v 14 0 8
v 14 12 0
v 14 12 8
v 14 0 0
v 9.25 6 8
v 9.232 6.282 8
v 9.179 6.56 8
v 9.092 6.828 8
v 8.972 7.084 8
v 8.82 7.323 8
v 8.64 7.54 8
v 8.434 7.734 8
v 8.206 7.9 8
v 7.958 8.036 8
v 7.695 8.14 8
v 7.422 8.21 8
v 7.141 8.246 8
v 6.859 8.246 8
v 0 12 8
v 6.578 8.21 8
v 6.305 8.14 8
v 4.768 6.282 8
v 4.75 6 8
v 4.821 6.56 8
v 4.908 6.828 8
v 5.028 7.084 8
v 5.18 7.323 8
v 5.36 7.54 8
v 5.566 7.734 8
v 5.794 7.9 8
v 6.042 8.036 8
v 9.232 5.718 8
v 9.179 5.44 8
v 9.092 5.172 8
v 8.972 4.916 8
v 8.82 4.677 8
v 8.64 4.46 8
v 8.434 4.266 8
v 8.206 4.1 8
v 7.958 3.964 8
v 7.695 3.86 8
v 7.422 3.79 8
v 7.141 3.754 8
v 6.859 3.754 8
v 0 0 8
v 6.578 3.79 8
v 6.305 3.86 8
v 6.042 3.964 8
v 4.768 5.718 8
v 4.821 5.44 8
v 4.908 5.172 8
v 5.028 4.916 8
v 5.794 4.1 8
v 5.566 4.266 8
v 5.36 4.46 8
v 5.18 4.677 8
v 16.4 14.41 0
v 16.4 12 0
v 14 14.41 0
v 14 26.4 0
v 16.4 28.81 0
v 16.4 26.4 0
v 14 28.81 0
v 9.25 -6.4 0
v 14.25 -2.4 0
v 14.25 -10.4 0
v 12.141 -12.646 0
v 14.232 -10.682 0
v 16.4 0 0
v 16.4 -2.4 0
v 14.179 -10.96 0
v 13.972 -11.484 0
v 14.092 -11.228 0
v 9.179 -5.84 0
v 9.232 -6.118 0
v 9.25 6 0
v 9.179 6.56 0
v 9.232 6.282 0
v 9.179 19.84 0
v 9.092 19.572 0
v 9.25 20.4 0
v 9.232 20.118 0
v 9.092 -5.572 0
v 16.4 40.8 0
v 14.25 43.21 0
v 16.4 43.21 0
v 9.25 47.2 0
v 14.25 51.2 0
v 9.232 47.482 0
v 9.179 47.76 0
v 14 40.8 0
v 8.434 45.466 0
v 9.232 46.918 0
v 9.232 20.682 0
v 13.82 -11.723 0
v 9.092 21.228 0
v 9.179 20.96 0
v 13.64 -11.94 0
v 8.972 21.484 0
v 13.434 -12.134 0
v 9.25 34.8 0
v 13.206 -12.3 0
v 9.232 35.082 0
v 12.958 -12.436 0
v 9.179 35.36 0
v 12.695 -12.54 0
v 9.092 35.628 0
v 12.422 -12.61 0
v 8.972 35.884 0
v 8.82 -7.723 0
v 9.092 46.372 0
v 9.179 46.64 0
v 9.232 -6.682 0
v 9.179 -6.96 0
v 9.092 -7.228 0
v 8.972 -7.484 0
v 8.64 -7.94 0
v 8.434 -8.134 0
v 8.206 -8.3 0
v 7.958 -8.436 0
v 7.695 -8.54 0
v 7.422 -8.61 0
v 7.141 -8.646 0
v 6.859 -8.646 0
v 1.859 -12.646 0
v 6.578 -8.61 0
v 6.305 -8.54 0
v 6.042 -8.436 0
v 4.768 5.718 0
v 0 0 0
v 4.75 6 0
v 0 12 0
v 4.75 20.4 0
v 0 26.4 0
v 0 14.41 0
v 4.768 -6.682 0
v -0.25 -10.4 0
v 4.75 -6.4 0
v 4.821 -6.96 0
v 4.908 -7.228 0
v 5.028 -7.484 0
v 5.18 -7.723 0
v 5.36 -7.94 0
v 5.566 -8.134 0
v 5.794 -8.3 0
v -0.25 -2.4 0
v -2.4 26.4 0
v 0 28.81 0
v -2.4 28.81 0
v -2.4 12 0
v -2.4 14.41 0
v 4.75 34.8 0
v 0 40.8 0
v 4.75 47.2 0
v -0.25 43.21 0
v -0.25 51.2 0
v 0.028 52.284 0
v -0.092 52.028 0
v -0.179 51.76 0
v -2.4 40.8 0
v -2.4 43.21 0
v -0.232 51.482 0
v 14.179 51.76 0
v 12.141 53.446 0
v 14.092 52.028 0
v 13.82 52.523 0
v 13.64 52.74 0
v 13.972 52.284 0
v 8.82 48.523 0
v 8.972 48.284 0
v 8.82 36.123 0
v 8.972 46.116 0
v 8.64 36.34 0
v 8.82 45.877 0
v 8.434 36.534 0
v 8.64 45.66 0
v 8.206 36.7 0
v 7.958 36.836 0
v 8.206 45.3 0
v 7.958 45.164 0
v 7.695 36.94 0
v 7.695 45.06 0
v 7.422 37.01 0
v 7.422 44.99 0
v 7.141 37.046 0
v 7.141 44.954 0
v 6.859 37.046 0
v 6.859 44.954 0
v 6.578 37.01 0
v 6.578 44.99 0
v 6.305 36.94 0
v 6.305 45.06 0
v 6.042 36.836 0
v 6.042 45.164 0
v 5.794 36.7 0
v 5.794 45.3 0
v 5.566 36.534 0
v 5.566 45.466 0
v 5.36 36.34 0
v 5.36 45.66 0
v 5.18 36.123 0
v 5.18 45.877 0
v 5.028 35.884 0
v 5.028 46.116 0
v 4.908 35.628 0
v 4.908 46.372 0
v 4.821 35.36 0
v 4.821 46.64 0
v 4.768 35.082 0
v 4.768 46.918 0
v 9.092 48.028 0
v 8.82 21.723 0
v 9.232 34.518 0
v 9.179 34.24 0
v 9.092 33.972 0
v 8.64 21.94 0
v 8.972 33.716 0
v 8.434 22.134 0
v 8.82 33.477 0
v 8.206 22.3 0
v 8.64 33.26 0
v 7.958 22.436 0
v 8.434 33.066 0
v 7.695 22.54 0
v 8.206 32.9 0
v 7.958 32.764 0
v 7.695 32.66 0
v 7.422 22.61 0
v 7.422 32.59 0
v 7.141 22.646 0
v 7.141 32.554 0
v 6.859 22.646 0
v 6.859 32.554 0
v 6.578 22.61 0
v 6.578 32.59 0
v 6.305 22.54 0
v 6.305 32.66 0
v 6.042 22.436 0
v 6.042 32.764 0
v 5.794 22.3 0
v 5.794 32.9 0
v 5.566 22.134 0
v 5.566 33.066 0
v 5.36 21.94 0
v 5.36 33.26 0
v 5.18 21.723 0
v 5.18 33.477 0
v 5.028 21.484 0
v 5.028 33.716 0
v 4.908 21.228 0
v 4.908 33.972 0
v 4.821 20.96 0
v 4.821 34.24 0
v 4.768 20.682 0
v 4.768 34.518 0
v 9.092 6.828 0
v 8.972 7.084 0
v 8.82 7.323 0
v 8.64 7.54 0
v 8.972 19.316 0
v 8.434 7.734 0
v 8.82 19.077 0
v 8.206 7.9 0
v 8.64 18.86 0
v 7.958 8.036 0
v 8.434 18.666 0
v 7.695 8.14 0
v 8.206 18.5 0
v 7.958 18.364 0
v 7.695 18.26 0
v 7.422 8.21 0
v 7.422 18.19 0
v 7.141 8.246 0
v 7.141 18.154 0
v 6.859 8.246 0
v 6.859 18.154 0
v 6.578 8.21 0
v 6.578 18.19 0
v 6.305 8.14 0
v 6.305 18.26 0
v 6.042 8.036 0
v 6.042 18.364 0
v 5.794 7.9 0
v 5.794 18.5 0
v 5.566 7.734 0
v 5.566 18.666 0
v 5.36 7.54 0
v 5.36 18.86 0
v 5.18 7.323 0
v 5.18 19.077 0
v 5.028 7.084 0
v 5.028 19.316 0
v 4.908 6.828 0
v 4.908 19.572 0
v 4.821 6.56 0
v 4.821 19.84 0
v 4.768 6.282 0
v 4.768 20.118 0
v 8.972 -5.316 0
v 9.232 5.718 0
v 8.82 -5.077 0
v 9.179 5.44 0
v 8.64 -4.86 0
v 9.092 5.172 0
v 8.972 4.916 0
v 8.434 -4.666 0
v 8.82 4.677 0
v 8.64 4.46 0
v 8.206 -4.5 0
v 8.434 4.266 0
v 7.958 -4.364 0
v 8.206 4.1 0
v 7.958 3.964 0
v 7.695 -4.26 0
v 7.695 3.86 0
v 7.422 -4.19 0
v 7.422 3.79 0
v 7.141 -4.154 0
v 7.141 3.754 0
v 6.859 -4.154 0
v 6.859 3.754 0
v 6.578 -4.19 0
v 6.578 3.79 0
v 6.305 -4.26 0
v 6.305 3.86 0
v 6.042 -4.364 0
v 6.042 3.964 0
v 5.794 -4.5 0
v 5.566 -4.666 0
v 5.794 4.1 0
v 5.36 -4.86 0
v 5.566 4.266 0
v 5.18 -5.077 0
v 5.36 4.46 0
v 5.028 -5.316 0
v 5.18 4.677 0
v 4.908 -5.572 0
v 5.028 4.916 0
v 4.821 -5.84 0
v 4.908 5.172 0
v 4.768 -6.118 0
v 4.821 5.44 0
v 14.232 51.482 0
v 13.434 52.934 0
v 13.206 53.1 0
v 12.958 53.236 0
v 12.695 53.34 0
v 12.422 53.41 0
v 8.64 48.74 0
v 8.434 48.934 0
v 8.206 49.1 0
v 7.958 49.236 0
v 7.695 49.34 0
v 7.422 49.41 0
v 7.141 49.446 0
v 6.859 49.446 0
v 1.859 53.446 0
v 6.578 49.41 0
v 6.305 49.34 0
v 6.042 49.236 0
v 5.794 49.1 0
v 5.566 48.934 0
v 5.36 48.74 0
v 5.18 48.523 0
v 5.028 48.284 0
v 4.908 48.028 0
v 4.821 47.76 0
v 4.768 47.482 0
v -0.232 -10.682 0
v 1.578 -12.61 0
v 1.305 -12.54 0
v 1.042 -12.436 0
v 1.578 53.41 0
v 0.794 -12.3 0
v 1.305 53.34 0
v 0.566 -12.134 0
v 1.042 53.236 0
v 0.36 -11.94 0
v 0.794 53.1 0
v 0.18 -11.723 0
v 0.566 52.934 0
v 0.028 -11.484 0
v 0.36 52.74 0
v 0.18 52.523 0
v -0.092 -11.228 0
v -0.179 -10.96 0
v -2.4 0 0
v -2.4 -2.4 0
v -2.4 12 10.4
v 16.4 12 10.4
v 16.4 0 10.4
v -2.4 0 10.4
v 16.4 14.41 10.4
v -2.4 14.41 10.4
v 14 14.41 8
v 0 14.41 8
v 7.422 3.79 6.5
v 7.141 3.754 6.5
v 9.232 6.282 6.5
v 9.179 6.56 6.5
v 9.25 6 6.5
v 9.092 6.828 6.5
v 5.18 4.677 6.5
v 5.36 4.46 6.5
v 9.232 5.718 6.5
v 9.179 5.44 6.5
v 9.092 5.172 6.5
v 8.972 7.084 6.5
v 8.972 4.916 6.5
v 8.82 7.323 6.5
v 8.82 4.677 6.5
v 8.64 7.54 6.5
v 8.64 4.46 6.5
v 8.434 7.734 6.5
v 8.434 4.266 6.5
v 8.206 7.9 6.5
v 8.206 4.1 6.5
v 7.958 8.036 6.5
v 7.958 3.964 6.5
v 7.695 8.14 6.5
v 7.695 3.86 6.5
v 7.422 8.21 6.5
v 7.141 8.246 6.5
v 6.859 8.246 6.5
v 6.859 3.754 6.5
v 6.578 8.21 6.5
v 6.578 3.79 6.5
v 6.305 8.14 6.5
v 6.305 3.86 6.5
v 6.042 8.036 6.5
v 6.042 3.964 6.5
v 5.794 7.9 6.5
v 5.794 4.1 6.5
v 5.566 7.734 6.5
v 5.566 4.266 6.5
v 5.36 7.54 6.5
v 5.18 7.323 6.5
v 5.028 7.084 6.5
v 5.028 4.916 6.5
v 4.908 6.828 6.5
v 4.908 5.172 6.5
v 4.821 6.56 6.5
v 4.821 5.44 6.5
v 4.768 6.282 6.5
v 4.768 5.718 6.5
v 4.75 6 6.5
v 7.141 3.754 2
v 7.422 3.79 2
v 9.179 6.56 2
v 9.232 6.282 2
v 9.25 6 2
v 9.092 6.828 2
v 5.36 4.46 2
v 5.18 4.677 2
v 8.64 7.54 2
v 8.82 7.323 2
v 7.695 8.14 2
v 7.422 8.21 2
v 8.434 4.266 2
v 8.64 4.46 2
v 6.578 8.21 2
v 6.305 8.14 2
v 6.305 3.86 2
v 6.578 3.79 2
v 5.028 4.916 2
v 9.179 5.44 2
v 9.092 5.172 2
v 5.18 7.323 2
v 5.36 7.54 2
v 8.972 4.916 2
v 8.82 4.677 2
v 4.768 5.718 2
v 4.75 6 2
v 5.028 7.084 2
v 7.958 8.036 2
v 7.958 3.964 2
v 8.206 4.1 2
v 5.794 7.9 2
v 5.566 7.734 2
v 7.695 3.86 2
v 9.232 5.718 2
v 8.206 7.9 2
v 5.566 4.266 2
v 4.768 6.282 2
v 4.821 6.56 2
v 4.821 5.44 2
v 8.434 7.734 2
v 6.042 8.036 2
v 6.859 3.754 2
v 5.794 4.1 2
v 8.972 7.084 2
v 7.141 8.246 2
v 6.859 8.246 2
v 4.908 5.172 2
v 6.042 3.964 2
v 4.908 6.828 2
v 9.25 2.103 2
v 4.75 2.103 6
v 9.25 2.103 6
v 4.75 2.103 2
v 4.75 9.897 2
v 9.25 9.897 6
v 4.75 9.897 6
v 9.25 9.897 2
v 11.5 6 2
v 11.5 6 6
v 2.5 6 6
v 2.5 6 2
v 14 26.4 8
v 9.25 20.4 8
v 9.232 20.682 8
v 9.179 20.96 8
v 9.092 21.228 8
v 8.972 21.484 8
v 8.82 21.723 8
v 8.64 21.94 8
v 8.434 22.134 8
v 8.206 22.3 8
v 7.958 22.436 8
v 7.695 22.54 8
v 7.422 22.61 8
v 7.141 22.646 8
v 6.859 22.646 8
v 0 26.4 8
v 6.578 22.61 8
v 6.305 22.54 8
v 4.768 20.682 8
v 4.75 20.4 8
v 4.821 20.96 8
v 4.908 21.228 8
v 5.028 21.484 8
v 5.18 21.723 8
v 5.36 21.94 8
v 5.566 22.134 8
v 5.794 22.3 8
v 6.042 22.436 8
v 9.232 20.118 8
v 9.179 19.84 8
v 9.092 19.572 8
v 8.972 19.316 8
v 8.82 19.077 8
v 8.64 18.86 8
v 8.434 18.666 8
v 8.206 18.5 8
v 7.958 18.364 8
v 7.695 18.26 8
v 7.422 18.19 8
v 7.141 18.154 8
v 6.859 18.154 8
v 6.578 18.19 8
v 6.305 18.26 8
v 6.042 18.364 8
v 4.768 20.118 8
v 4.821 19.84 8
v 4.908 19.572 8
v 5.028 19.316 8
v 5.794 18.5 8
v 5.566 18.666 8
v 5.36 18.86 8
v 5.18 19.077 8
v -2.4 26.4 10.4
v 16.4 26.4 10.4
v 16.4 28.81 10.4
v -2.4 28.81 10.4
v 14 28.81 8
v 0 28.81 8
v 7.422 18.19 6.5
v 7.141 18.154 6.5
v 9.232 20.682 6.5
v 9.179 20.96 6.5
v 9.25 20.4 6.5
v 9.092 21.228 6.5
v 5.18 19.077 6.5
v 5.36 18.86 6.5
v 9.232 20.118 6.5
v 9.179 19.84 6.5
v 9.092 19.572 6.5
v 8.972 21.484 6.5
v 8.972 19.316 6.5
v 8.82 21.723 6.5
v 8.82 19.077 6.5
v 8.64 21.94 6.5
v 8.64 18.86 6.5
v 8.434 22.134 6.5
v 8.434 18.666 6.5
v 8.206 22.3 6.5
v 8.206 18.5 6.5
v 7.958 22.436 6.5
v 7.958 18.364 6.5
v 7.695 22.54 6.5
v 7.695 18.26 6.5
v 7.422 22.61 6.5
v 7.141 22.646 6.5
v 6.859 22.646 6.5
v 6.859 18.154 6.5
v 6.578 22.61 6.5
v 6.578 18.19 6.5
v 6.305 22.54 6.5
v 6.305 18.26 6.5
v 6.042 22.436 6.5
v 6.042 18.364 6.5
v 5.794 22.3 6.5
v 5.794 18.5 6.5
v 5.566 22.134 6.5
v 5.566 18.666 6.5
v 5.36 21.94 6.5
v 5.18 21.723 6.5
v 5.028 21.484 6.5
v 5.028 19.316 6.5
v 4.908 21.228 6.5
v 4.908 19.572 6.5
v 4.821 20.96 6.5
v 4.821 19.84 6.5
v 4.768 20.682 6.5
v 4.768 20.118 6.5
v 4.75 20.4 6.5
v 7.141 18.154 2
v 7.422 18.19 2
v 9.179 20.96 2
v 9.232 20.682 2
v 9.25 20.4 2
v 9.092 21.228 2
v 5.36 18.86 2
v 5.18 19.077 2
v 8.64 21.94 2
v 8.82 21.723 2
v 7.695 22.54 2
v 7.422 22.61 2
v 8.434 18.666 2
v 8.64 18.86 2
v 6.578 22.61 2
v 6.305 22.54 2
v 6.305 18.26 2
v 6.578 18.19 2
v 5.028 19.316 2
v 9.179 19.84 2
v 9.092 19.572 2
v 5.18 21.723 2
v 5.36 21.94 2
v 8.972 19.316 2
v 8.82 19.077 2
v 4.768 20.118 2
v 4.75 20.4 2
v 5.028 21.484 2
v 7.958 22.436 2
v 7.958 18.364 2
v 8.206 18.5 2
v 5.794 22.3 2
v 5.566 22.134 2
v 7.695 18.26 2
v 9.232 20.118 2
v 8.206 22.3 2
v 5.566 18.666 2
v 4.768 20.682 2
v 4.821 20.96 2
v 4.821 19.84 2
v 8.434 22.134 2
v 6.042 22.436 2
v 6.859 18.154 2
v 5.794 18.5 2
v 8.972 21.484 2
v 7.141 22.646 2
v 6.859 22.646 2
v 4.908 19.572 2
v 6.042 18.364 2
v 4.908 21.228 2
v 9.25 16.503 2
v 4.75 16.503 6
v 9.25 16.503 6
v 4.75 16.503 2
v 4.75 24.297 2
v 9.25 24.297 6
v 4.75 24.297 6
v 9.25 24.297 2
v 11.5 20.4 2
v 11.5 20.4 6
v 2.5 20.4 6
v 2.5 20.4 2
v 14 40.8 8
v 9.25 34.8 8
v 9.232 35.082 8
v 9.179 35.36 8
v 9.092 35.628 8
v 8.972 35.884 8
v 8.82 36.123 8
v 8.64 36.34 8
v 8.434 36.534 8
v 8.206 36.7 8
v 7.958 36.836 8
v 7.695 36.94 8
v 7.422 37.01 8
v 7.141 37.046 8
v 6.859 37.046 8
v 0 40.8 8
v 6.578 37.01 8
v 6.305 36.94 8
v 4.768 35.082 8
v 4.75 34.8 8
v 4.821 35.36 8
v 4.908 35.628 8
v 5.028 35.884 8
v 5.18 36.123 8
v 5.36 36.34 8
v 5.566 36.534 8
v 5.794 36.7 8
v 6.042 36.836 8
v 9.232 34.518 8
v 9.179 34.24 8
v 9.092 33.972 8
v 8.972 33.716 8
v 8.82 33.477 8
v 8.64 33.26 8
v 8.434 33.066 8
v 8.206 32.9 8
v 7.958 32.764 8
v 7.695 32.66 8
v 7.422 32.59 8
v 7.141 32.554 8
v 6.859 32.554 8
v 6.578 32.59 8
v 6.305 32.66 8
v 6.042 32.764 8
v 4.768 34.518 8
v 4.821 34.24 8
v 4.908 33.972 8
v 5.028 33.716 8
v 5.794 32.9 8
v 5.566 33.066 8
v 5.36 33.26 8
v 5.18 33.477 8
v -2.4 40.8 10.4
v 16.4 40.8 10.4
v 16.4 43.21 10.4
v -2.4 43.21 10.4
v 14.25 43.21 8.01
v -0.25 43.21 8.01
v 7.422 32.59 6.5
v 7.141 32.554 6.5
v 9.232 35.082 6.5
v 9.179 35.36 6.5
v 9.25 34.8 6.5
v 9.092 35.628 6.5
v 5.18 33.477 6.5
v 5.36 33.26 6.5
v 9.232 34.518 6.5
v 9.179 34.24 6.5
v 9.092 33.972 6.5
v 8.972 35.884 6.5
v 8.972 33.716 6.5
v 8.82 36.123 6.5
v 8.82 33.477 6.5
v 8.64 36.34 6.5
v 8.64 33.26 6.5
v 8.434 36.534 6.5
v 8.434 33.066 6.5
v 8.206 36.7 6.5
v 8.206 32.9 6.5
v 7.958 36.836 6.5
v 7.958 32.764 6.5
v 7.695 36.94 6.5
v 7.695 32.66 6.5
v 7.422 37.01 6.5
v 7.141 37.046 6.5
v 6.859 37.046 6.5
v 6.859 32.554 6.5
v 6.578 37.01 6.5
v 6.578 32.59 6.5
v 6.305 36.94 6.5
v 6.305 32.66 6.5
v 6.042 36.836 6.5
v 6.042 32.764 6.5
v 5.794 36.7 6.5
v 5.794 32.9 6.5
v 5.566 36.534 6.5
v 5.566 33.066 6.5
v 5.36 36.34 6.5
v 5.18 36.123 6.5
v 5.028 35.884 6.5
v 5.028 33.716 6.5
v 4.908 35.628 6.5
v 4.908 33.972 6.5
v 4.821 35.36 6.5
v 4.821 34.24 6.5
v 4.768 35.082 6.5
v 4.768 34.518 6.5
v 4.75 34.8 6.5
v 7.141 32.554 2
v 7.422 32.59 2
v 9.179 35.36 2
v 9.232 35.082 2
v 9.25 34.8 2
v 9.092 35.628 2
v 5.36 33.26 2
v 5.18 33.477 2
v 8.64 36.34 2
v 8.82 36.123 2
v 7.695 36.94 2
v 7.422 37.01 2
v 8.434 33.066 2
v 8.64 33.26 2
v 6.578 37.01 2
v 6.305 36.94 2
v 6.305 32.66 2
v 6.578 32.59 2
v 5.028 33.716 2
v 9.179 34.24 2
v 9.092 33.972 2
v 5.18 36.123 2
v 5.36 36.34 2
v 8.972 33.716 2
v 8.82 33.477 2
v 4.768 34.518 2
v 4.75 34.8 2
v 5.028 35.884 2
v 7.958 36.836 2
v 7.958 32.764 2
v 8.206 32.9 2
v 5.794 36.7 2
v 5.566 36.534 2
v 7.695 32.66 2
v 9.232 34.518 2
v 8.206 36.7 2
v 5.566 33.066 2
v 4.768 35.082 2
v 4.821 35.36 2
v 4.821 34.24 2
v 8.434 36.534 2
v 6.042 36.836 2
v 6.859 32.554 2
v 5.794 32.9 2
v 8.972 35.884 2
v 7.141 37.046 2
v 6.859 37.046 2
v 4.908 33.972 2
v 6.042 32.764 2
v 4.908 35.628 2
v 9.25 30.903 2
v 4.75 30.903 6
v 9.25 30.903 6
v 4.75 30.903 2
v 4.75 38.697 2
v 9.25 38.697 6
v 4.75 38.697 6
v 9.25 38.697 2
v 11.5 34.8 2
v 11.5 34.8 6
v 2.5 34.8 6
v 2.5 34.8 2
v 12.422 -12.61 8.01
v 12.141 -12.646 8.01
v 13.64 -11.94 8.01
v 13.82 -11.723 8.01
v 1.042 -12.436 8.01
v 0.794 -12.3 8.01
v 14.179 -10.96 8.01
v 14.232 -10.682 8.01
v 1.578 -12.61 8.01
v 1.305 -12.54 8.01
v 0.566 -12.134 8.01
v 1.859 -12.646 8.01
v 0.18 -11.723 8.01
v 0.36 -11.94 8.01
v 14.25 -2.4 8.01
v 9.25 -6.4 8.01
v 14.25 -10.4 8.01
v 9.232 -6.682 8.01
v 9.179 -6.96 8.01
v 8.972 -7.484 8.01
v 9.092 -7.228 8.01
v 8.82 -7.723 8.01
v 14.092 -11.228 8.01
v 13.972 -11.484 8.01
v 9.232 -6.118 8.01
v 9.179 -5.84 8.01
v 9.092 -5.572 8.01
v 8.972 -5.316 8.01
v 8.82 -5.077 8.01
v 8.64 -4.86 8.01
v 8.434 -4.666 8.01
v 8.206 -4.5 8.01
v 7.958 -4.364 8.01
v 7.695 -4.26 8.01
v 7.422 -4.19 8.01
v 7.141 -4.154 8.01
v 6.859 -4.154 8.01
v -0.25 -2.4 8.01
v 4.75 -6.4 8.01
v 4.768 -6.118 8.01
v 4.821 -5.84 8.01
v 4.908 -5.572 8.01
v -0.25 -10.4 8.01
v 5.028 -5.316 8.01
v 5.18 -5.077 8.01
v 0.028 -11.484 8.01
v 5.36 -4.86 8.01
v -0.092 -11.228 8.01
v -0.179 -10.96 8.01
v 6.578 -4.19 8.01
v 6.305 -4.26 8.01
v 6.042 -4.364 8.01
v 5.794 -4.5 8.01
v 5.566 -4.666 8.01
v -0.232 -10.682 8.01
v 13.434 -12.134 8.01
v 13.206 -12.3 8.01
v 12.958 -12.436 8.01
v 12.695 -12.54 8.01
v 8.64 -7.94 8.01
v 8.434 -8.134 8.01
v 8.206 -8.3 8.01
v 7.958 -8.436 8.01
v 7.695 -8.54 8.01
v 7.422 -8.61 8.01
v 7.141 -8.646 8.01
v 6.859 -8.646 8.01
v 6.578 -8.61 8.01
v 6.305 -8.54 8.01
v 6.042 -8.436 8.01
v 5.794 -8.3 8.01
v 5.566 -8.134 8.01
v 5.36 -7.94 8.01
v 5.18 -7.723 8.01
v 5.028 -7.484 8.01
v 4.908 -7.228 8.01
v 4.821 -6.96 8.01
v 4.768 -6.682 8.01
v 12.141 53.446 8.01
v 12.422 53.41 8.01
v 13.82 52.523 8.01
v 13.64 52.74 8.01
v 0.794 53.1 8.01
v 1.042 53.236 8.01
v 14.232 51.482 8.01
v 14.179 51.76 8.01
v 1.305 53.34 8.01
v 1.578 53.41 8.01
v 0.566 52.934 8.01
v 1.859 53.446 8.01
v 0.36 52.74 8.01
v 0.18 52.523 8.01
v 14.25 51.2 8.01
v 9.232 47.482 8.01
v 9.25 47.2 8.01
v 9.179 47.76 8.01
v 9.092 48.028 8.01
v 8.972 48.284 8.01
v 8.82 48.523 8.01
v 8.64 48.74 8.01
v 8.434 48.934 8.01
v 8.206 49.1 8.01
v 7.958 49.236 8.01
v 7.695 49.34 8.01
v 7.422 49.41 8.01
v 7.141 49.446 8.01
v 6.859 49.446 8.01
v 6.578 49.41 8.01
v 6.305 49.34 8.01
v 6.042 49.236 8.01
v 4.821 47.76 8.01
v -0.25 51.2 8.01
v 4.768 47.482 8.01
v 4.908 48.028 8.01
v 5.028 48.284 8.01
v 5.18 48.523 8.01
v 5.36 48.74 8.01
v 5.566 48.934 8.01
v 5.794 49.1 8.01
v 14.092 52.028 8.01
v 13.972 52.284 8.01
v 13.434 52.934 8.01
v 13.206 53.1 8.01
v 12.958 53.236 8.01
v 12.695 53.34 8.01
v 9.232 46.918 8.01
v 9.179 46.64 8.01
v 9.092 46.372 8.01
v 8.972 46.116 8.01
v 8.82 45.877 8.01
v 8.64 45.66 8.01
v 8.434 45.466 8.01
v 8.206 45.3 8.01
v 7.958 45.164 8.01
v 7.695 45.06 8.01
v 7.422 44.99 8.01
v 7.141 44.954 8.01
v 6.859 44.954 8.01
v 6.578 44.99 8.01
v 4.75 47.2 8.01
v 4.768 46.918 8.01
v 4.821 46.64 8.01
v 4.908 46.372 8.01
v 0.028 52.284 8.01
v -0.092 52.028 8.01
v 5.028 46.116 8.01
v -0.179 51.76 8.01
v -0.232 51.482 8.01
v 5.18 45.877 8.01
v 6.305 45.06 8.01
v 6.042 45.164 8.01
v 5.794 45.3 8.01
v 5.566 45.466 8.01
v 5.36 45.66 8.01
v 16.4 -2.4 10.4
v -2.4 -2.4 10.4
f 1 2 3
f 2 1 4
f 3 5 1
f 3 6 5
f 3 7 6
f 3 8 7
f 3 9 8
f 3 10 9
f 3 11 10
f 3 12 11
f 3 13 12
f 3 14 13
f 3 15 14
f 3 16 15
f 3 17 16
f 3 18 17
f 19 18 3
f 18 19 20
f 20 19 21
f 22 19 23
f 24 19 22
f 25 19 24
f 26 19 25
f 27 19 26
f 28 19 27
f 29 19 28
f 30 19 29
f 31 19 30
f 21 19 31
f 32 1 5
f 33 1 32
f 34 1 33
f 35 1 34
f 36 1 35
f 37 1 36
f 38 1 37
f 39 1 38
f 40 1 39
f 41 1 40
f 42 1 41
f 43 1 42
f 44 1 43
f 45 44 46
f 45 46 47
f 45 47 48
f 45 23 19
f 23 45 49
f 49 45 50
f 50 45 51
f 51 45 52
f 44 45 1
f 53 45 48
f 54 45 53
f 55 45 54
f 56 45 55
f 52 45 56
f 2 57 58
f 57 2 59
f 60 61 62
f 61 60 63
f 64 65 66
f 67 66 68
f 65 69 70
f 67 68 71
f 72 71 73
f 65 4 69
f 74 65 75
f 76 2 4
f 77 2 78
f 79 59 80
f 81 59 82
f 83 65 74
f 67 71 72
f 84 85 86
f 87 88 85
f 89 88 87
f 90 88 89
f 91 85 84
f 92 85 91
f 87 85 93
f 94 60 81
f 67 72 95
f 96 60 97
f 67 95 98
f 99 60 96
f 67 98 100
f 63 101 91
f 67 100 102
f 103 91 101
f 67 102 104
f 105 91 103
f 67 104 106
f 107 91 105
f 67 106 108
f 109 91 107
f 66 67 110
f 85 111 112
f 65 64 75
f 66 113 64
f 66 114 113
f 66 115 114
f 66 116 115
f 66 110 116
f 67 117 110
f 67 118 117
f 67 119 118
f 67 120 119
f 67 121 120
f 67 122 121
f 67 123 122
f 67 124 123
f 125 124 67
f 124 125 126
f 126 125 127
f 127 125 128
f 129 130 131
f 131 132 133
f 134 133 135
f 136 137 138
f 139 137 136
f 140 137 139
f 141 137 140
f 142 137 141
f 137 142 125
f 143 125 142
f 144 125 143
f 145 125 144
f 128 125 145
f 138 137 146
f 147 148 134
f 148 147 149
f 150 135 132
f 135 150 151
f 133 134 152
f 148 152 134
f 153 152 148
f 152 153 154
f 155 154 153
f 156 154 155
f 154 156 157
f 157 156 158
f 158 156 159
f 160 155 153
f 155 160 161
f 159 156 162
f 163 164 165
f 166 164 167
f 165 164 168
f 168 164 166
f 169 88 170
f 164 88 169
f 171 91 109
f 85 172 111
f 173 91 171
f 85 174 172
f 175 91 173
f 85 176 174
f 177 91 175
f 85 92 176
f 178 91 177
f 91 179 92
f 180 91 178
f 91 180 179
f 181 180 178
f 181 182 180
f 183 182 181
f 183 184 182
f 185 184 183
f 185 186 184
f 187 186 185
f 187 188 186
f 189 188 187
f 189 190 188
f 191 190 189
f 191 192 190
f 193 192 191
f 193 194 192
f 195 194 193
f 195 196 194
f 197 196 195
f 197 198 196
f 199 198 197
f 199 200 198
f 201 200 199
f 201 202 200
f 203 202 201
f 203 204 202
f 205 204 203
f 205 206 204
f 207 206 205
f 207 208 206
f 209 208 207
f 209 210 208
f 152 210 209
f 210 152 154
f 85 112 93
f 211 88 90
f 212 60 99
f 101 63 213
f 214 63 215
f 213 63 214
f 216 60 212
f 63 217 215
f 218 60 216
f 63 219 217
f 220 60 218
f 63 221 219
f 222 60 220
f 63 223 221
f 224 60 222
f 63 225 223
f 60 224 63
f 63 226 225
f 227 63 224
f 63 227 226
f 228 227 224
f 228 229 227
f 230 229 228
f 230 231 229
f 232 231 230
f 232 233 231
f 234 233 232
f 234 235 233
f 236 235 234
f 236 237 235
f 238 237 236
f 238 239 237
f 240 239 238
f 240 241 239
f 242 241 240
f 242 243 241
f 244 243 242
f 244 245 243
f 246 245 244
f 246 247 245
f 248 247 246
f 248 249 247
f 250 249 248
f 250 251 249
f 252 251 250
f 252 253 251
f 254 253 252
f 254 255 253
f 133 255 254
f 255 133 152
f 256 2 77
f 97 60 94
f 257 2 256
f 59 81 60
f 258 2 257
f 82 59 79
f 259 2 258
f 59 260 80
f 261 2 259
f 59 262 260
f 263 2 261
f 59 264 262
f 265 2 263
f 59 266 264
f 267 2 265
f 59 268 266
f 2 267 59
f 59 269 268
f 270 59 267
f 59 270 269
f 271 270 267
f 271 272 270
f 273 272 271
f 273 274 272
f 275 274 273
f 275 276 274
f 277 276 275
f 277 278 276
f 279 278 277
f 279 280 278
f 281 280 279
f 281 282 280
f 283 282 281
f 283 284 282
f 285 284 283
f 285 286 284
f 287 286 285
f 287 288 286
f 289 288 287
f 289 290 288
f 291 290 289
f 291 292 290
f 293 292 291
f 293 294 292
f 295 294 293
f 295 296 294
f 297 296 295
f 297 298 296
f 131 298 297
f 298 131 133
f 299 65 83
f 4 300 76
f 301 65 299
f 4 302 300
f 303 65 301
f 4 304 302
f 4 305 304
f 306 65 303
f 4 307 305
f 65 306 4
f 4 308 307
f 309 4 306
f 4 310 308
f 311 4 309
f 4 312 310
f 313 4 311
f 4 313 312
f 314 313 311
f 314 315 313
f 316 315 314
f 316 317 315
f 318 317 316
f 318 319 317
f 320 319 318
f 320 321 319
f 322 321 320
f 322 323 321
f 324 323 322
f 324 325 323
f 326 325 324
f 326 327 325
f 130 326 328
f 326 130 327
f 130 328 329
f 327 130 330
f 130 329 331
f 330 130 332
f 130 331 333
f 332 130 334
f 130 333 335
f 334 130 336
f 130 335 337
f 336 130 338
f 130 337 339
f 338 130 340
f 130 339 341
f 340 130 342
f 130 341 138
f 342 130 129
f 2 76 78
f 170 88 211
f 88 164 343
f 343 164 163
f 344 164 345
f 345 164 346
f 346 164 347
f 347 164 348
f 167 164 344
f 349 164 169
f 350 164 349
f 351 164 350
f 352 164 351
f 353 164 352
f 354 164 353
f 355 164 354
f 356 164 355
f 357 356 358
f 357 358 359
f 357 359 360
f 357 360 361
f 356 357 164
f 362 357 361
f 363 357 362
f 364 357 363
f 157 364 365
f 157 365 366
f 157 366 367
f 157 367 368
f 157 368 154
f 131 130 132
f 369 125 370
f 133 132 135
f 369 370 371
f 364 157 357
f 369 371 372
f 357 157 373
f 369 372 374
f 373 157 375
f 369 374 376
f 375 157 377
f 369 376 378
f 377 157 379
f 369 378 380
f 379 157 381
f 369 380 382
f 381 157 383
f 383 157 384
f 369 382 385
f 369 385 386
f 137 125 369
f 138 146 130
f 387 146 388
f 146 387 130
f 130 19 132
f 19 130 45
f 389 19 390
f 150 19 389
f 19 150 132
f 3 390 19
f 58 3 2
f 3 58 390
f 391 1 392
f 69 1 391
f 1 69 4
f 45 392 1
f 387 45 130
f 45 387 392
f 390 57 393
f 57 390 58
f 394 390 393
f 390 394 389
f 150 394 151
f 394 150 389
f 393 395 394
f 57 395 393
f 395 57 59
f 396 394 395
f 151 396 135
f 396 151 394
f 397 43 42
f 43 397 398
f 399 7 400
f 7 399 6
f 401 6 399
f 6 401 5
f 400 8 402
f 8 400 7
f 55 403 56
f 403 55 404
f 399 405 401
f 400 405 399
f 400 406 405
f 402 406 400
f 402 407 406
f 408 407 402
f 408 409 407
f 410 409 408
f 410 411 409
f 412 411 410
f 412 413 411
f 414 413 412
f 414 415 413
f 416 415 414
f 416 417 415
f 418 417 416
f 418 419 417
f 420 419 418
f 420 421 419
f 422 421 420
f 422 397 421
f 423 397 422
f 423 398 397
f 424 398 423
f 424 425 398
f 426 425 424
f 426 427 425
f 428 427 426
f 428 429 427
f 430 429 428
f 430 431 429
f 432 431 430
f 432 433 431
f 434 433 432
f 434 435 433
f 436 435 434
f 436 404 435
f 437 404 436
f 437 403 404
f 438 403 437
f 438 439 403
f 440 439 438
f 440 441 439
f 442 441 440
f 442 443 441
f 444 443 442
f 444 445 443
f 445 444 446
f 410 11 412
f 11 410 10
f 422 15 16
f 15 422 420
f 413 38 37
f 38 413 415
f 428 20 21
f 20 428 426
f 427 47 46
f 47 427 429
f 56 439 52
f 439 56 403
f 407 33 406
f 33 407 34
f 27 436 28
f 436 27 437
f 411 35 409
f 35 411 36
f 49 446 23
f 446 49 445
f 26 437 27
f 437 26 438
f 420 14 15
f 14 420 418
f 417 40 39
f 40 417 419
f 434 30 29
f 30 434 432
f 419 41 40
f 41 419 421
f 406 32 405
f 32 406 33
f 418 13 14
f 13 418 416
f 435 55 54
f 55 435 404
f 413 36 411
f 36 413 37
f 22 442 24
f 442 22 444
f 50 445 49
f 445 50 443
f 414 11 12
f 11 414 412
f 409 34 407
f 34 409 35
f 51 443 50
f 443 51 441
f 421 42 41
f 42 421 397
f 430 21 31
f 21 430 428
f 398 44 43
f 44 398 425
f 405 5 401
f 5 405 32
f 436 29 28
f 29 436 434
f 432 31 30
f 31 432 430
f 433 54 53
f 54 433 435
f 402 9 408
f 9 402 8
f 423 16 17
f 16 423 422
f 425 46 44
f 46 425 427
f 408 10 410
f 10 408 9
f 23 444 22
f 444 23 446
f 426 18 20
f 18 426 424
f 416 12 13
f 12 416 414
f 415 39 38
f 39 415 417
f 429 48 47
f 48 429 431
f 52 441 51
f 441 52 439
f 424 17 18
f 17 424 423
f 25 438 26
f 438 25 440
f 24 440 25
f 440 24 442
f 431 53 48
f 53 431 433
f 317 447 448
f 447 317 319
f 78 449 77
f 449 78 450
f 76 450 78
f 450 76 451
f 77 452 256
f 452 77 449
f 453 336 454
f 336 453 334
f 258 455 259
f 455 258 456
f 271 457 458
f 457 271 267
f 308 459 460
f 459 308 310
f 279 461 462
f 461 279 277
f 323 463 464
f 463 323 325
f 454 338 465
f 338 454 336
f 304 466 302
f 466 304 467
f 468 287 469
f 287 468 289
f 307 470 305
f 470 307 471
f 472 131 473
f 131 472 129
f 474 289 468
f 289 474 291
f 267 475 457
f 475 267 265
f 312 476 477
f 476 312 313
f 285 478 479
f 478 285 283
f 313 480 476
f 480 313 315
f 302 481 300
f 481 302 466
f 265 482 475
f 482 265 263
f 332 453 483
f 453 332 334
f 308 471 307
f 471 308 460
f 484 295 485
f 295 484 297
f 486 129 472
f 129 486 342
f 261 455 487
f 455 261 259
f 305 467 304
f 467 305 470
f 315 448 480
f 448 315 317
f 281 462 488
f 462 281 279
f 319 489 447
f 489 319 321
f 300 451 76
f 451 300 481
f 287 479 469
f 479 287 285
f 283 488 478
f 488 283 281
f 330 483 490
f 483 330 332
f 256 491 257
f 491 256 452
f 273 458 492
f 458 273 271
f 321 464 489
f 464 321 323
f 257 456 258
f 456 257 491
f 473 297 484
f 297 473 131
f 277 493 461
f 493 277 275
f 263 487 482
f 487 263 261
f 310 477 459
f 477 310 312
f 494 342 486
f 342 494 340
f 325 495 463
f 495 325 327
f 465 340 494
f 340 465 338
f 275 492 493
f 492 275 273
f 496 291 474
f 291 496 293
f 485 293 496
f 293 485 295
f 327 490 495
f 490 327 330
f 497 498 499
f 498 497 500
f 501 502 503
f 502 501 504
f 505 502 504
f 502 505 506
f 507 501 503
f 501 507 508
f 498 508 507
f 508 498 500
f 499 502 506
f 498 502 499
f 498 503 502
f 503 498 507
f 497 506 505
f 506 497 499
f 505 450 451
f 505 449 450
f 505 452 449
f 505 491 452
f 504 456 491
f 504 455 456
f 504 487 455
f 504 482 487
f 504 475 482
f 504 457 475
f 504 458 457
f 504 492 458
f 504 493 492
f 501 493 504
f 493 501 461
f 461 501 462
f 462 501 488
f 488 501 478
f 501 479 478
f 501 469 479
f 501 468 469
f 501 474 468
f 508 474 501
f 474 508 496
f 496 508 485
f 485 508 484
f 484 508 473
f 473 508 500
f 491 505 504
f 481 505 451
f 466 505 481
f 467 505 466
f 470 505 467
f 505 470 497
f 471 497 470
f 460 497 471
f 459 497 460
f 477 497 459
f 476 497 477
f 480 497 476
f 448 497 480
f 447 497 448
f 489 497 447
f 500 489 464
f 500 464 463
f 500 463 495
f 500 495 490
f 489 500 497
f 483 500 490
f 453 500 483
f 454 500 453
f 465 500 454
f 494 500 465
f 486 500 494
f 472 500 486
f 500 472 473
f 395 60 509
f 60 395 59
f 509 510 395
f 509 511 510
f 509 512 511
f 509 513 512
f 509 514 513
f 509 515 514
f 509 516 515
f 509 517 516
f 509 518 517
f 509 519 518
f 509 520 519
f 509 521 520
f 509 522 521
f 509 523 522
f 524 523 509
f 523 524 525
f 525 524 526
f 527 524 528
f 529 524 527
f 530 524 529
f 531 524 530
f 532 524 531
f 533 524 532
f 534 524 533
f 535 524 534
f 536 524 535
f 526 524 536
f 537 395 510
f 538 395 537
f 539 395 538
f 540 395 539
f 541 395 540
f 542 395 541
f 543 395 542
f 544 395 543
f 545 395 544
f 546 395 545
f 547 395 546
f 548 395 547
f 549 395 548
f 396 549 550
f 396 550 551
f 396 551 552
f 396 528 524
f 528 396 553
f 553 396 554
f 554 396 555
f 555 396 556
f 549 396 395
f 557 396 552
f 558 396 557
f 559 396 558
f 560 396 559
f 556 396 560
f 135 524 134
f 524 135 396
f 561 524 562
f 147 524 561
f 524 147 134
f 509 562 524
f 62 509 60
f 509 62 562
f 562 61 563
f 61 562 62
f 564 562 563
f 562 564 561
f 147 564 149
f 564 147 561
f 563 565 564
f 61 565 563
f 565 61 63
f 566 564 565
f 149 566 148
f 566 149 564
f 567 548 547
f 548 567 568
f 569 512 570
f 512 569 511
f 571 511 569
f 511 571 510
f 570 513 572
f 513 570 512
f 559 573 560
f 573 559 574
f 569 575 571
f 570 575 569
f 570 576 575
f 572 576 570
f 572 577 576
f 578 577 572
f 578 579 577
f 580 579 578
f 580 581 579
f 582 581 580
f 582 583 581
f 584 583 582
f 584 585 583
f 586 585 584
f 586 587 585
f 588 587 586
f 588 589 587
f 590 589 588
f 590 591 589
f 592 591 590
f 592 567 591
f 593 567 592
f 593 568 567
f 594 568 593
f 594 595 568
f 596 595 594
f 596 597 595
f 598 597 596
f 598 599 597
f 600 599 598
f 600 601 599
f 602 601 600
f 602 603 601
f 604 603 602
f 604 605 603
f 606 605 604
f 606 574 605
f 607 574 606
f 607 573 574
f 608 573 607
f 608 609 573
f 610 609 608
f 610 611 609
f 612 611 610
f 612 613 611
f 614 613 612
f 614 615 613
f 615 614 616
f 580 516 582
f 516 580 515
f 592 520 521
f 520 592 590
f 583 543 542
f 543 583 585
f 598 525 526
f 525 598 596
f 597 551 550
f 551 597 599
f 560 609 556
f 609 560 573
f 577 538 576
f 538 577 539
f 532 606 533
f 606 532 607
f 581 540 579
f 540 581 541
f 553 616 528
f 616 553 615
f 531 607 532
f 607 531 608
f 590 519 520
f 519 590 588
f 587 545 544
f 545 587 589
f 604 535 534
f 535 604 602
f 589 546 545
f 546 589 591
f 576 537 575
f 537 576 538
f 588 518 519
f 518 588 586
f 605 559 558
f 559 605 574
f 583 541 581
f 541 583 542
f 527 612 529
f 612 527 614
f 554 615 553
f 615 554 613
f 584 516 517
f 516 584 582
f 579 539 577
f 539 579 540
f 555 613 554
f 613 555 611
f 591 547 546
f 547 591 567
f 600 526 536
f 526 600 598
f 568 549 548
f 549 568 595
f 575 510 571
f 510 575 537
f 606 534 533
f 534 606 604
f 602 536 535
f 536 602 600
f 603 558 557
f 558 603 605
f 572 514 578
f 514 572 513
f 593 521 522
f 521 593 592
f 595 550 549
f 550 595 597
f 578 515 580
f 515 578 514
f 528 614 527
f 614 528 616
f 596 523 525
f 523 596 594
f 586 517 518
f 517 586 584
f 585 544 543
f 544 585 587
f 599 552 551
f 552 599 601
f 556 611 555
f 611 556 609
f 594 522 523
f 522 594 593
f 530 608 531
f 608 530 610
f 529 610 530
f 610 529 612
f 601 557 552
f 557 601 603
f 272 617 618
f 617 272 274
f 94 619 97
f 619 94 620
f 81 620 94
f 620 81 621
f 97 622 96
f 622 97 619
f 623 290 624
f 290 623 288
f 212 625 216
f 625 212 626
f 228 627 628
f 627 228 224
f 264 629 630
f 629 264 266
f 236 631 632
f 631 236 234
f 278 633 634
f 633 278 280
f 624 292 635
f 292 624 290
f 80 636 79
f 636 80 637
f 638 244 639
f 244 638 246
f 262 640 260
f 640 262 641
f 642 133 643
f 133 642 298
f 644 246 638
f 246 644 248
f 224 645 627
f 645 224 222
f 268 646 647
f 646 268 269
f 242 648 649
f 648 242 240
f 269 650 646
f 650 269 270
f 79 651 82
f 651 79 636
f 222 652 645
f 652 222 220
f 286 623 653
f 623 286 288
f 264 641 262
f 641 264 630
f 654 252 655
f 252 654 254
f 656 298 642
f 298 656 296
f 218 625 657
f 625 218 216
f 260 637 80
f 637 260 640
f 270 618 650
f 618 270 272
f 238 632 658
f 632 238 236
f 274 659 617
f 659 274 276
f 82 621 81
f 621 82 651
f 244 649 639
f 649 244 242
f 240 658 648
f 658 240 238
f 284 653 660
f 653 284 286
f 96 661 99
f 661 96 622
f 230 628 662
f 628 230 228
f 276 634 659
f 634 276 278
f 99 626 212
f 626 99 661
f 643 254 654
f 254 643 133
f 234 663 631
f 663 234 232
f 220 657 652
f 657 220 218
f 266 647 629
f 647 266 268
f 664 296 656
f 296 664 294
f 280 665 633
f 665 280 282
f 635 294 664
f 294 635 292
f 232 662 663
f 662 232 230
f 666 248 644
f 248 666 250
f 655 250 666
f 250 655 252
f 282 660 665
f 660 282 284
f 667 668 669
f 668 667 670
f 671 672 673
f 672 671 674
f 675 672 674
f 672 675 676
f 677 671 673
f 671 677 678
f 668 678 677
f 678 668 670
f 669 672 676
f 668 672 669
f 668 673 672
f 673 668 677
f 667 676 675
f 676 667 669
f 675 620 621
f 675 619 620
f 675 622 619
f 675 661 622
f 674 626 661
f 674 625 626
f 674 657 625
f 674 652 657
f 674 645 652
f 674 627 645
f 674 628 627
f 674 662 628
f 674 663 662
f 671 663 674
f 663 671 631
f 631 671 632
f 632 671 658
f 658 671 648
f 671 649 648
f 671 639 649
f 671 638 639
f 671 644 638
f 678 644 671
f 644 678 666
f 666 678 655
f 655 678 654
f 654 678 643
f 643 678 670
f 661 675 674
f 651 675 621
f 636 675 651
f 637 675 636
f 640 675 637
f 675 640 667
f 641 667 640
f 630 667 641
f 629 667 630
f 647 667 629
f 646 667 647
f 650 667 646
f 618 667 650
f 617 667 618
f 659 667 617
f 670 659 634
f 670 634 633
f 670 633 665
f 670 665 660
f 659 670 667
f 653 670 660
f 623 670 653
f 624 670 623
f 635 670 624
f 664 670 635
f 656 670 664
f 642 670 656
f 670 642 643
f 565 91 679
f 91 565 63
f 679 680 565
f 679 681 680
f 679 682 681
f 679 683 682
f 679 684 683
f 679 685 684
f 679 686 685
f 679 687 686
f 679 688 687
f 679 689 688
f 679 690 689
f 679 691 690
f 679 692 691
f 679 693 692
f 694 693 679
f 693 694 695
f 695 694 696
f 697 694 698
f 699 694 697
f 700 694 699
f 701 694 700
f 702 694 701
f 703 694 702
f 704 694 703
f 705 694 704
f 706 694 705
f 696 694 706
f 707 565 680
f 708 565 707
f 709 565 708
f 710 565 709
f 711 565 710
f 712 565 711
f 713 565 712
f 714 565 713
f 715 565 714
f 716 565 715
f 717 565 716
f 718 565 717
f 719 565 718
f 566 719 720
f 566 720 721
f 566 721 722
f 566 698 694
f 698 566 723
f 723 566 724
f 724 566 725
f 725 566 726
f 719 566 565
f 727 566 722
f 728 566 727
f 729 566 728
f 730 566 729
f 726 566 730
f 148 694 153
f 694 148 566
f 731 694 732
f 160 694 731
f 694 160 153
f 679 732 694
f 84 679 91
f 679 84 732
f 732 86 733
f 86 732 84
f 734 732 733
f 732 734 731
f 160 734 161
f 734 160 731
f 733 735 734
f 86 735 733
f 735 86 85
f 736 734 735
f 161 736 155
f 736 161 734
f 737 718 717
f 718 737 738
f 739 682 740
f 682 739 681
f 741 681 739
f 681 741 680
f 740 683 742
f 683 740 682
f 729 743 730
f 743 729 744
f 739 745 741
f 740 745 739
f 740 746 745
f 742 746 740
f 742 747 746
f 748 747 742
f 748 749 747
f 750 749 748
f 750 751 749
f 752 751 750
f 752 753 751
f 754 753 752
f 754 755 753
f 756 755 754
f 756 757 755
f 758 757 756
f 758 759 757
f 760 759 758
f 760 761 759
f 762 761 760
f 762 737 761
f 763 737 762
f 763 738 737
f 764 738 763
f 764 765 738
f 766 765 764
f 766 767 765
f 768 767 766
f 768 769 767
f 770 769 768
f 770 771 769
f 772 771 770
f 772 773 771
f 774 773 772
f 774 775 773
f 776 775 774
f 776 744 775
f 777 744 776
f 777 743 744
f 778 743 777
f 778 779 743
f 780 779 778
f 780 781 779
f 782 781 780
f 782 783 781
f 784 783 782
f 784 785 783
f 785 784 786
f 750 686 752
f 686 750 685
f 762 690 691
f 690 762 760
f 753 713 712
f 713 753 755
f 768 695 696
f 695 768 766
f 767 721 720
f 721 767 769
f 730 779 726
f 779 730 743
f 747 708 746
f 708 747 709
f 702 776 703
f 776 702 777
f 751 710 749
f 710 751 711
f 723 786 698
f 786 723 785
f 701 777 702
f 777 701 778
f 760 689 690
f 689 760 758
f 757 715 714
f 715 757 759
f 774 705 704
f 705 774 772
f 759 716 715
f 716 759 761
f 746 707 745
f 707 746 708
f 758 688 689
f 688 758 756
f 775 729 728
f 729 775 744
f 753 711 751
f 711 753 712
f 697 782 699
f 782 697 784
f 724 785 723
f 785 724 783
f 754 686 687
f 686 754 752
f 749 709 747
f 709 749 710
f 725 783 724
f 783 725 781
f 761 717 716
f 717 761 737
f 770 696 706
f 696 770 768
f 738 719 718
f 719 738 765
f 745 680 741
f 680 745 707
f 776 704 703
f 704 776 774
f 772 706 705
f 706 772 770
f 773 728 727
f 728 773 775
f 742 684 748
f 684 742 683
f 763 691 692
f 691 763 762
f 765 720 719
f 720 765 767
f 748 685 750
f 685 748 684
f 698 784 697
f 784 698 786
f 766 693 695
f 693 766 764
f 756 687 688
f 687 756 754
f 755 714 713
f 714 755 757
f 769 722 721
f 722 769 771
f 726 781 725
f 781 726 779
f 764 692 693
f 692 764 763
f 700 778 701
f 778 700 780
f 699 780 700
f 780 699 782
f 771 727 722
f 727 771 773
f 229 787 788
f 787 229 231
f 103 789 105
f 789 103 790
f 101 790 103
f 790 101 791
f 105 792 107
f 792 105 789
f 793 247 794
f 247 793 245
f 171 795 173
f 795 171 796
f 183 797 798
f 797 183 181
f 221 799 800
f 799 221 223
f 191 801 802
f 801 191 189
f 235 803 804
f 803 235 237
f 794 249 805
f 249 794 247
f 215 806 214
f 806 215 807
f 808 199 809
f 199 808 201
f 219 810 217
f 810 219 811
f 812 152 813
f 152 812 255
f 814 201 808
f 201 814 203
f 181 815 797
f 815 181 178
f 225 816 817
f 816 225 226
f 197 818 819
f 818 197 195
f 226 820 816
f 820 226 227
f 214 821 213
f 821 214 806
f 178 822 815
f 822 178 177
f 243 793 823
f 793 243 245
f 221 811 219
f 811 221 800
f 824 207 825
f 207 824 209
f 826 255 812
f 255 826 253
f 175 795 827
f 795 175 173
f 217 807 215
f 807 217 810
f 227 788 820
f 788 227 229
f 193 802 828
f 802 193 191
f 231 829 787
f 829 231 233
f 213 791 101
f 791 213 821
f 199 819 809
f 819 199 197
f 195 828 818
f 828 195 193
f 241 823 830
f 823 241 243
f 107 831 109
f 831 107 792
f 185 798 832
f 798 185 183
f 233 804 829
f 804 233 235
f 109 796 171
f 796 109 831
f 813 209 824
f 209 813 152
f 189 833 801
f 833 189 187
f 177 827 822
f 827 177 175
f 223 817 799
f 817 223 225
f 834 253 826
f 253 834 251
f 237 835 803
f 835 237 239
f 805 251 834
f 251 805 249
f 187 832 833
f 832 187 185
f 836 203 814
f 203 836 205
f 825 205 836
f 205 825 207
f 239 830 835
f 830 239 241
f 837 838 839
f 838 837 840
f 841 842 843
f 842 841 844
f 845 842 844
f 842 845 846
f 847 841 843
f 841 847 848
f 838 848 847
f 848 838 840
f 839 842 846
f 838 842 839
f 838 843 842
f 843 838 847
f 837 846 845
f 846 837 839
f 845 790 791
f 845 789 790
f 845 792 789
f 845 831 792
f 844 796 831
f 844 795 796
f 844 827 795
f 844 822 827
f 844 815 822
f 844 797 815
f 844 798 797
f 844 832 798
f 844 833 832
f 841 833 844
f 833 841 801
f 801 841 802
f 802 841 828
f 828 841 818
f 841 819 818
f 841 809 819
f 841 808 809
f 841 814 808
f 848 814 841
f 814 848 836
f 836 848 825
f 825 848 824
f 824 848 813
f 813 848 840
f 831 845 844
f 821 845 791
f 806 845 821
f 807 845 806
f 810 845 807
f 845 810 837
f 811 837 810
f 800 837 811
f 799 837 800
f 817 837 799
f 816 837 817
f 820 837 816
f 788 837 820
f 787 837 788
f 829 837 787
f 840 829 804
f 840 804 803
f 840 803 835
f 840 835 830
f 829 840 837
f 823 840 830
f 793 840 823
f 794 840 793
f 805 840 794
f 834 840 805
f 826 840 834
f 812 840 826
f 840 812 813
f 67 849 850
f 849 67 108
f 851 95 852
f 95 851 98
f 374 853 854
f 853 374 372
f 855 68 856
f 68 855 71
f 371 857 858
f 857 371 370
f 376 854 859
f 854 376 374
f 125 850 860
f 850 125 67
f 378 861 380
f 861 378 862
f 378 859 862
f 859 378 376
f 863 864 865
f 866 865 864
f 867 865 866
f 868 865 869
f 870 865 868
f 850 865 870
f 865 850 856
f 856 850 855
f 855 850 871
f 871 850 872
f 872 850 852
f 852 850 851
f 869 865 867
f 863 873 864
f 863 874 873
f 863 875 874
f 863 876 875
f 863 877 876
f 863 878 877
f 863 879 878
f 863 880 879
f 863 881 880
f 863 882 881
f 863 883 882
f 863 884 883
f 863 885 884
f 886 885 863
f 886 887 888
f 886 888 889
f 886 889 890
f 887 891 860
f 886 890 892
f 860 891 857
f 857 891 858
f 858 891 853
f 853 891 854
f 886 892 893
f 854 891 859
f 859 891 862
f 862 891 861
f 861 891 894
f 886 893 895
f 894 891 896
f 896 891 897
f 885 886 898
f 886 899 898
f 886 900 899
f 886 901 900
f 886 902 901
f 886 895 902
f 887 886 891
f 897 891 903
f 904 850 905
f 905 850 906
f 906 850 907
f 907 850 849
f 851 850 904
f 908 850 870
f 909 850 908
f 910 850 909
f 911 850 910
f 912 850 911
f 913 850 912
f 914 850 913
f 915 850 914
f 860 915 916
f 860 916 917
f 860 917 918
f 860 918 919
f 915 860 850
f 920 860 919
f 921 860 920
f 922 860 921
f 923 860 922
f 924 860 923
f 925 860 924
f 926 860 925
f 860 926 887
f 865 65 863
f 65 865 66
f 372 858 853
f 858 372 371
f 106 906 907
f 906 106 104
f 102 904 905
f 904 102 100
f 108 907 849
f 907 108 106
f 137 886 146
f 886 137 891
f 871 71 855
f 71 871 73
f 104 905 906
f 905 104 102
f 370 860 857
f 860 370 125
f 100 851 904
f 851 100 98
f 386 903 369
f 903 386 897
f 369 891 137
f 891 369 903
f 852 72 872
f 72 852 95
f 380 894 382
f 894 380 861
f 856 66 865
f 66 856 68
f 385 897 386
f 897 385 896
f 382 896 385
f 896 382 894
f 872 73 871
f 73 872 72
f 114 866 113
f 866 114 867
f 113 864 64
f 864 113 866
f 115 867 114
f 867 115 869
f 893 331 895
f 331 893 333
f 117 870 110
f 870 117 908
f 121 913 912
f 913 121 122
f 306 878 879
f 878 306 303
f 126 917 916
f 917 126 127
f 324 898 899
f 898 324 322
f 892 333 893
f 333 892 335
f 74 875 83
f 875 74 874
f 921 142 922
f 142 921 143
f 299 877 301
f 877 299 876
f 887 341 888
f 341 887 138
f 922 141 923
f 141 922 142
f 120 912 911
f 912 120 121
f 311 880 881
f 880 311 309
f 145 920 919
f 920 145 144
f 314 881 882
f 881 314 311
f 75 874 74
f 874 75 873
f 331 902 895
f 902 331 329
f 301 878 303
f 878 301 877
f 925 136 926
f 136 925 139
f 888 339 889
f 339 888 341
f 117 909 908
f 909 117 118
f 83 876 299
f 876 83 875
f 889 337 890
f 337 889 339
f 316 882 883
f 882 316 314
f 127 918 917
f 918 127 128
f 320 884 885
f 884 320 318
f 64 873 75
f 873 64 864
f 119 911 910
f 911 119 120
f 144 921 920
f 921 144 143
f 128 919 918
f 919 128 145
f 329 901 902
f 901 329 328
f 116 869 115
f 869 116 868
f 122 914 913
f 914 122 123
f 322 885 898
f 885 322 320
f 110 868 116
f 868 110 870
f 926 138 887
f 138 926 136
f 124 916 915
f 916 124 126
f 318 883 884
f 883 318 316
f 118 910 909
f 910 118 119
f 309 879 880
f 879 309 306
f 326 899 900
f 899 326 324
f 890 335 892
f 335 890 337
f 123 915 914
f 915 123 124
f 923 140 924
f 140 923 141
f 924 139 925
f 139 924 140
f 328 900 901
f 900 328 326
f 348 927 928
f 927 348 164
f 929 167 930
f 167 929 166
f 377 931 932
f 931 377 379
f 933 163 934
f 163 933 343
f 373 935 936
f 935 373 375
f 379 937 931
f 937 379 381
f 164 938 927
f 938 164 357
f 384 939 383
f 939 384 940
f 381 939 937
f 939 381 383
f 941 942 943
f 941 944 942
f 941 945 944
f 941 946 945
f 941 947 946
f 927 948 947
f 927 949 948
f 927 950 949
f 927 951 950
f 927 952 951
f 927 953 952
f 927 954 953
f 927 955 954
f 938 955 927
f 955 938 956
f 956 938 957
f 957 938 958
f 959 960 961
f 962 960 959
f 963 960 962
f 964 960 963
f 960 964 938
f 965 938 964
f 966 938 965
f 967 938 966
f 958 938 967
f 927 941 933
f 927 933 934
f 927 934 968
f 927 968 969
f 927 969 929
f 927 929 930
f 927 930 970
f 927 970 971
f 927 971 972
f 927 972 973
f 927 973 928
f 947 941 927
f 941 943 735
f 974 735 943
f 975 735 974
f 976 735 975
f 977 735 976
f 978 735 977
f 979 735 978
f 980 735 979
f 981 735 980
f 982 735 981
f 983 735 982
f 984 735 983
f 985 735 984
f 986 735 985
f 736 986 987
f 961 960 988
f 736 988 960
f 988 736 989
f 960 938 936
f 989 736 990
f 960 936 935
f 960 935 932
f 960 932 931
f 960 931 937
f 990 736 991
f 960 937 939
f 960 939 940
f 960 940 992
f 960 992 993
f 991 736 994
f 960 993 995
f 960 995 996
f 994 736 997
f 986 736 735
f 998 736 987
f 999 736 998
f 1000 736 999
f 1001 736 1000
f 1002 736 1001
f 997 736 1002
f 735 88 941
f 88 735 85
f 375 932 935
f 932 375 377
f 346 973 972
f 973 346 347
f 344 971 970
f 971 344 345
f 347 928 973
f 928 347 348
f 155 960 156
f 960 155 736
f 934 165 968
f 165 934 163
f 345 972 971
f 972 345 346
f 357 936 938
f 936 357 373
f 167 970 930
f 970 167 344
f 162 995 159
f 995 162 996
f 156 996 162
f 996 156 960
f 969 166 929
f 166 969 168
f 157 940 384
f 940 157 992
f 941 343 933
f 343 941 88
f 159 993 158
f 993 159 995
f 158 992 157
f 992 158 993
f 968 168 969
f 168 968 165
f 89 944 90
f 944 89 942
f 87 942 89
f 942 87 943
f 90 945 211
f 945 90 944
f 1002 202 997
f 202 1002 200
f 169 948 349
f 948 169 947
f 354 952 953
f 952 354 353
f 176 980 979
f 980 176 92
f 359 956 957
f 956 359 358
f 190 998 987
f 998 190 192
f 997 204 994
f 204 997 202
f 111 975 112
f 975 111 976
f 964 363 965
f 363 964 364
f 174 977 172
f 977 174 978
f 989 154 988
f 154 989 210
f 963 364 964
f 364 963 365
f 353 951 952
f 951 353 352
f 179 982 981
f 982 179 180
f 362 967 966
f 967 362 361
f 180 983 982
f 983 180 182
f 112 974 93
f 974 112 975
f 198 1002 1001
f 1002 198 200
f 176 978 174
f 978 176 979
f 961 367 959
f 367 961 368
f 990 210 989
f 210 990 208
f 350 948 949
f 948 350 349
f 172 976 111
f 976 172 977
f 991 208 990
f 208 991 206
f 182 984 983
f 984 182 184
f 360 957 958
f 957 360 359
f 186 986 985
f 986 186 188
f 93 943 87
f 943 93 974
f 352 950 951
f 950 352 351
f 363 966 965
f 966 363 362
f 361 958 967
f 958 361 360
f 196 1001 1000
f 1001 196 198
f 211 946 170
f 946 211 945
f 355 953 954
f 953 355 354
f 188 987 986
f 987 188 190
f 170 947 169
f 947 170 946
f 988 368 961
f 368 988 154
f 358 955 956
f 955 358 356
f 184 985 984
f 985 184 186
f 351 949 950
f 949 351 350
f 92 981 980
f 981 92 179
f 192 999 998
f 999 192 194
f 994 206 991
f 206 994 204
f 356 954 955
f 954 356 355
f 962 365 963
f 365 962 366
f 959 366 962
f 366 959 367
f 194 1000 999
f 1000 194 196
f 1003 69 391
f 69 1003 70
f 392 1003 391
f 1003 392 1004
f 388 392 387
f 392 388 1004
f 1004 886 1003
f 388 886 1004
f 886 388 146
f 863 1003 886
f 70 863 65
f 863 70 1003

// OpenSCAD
//
// Terminal Block
//
//

//How many terminals in the block
NoTerminals = 3; // [1,2,3,4,5,6,7,8,9,10,11,12,13,14,15]
// Diameter of screw in terminal
TerminalHoleSize = 4;
//Terminal Height in mm
TerminalHeight = 8;
//Width of each terminal in mm
TerminalWidth = 12;
//Block Width in mm
BlockWidth = 14;
//Terminal Divider width in mm
TerminalDivider = 2.4;
// Nut Thickness
NutThickness = 4;
// Tabs required
ReqTabs = "Yes"; //[Yes,No]
//Mounting tab length
MountTabLength = 8;
//Mounting tab Height
MountTabHeight = 8;
//Mount tab hole diameter in mm
MountHole = 4;
//Clearence
Clearence = 0.5; 
//Are the nuts Enclosed (nuts added during build - print must be paused) or Slotted (nuts added after build) or Bolted that is Hex head bolt inserted post print.
Enclose =1; //[1:Enclosed, 0: Slotted, 2:Bolted]


//Height of the top of the nut above the base
NutHeight = Enclose > 1 ? NutThickness : TerminalHeight - 2;
//echo (NutHeight);


for (i =[ 0:NoTerminals - 1]) {
	translate ([0,(TerminalWidth + TerminalDivider) * i ,0]) 
		terminal() ;
	}

translate ([- TerminalDivider ,- TerminalDivider , 0]) 
		cube([BlockWidth + TerminalDivider * 2,
				TerminalDivider ,
				TerminalHeight + TerminalDivider]);
if (ReqTabs == "Yes") {
	translate ([0,-TerminalDivider,0]) mirror ([0,1,0]) tab() ;
	translate ([0,(TerminalWidth + TerminalDivider) * NoTerminals,0]) tab() ;
	}

module tab() {
	difference () {
		translate ([MountHole /2, 0,0]) 
			minkowski() {
				cube([BlockWidth - MountHole,
					MountTabLength ,
					MountTabHeight ]);
				cylinder ( r= (MountHole + Clearence )/2 , h =.01 , $fn=50);
			}
		translate ([BlockWidth /2, MountTabLength /2, -1]) cylinder ( r= (MountHole + Clearence )/2 , h = MountTabHeight + 2, $fn=50);
	}
}



module terminal() {
difference() {
	union() {
		cube([BlockWidth,TerminalWidth,TerminalHeight]);
		translate ([- TerminalDivider , TerminalWidth , 0]) 
				cube([BlockWidth + (TerminalDivider * 2),
					TerminalDivider + 0.01 ,
					TerminalHeight + TerminalDivider]);
	}
	translate ([BlockWidth / 2,
				TerminalWidth / 2,  
				NutHeight  + .5]) 
			cylinder ( r= (TerminalHoleSize + Clearence )/2 , 
				h = TerminalHeight, $fn=50);

	translate ([BlockWidth /2,
		TerminalWidth /2,  -1]) 
		cylinder ( r= ( TerminalHoleSize + Clearence ) / 2 , 
		h = NutHeight - (NutThickness / 2) + 1, $fn=50);

	translate ([BlockWidth /2,
				TerminalWidth /2,  
				NutHeight - NutThickness ]) 
			cylinder ( r= TerminalHoleSize + ( Clearence ) , h = NutThickness , $fn=6);
	if (Enclose == 0) {
		translate ([BlockWidth /2 + .1,
					(TerminalWidth  - (TerminalHoleSize + Clearence) * 1.8) / 2 ,  
					NutHeight - NutThickness  ]) 
			cube([ BlockWidth /2	, (TerminalHoleSize + Clearence) * 1.8, NutThickness]);
		}
	}
}
